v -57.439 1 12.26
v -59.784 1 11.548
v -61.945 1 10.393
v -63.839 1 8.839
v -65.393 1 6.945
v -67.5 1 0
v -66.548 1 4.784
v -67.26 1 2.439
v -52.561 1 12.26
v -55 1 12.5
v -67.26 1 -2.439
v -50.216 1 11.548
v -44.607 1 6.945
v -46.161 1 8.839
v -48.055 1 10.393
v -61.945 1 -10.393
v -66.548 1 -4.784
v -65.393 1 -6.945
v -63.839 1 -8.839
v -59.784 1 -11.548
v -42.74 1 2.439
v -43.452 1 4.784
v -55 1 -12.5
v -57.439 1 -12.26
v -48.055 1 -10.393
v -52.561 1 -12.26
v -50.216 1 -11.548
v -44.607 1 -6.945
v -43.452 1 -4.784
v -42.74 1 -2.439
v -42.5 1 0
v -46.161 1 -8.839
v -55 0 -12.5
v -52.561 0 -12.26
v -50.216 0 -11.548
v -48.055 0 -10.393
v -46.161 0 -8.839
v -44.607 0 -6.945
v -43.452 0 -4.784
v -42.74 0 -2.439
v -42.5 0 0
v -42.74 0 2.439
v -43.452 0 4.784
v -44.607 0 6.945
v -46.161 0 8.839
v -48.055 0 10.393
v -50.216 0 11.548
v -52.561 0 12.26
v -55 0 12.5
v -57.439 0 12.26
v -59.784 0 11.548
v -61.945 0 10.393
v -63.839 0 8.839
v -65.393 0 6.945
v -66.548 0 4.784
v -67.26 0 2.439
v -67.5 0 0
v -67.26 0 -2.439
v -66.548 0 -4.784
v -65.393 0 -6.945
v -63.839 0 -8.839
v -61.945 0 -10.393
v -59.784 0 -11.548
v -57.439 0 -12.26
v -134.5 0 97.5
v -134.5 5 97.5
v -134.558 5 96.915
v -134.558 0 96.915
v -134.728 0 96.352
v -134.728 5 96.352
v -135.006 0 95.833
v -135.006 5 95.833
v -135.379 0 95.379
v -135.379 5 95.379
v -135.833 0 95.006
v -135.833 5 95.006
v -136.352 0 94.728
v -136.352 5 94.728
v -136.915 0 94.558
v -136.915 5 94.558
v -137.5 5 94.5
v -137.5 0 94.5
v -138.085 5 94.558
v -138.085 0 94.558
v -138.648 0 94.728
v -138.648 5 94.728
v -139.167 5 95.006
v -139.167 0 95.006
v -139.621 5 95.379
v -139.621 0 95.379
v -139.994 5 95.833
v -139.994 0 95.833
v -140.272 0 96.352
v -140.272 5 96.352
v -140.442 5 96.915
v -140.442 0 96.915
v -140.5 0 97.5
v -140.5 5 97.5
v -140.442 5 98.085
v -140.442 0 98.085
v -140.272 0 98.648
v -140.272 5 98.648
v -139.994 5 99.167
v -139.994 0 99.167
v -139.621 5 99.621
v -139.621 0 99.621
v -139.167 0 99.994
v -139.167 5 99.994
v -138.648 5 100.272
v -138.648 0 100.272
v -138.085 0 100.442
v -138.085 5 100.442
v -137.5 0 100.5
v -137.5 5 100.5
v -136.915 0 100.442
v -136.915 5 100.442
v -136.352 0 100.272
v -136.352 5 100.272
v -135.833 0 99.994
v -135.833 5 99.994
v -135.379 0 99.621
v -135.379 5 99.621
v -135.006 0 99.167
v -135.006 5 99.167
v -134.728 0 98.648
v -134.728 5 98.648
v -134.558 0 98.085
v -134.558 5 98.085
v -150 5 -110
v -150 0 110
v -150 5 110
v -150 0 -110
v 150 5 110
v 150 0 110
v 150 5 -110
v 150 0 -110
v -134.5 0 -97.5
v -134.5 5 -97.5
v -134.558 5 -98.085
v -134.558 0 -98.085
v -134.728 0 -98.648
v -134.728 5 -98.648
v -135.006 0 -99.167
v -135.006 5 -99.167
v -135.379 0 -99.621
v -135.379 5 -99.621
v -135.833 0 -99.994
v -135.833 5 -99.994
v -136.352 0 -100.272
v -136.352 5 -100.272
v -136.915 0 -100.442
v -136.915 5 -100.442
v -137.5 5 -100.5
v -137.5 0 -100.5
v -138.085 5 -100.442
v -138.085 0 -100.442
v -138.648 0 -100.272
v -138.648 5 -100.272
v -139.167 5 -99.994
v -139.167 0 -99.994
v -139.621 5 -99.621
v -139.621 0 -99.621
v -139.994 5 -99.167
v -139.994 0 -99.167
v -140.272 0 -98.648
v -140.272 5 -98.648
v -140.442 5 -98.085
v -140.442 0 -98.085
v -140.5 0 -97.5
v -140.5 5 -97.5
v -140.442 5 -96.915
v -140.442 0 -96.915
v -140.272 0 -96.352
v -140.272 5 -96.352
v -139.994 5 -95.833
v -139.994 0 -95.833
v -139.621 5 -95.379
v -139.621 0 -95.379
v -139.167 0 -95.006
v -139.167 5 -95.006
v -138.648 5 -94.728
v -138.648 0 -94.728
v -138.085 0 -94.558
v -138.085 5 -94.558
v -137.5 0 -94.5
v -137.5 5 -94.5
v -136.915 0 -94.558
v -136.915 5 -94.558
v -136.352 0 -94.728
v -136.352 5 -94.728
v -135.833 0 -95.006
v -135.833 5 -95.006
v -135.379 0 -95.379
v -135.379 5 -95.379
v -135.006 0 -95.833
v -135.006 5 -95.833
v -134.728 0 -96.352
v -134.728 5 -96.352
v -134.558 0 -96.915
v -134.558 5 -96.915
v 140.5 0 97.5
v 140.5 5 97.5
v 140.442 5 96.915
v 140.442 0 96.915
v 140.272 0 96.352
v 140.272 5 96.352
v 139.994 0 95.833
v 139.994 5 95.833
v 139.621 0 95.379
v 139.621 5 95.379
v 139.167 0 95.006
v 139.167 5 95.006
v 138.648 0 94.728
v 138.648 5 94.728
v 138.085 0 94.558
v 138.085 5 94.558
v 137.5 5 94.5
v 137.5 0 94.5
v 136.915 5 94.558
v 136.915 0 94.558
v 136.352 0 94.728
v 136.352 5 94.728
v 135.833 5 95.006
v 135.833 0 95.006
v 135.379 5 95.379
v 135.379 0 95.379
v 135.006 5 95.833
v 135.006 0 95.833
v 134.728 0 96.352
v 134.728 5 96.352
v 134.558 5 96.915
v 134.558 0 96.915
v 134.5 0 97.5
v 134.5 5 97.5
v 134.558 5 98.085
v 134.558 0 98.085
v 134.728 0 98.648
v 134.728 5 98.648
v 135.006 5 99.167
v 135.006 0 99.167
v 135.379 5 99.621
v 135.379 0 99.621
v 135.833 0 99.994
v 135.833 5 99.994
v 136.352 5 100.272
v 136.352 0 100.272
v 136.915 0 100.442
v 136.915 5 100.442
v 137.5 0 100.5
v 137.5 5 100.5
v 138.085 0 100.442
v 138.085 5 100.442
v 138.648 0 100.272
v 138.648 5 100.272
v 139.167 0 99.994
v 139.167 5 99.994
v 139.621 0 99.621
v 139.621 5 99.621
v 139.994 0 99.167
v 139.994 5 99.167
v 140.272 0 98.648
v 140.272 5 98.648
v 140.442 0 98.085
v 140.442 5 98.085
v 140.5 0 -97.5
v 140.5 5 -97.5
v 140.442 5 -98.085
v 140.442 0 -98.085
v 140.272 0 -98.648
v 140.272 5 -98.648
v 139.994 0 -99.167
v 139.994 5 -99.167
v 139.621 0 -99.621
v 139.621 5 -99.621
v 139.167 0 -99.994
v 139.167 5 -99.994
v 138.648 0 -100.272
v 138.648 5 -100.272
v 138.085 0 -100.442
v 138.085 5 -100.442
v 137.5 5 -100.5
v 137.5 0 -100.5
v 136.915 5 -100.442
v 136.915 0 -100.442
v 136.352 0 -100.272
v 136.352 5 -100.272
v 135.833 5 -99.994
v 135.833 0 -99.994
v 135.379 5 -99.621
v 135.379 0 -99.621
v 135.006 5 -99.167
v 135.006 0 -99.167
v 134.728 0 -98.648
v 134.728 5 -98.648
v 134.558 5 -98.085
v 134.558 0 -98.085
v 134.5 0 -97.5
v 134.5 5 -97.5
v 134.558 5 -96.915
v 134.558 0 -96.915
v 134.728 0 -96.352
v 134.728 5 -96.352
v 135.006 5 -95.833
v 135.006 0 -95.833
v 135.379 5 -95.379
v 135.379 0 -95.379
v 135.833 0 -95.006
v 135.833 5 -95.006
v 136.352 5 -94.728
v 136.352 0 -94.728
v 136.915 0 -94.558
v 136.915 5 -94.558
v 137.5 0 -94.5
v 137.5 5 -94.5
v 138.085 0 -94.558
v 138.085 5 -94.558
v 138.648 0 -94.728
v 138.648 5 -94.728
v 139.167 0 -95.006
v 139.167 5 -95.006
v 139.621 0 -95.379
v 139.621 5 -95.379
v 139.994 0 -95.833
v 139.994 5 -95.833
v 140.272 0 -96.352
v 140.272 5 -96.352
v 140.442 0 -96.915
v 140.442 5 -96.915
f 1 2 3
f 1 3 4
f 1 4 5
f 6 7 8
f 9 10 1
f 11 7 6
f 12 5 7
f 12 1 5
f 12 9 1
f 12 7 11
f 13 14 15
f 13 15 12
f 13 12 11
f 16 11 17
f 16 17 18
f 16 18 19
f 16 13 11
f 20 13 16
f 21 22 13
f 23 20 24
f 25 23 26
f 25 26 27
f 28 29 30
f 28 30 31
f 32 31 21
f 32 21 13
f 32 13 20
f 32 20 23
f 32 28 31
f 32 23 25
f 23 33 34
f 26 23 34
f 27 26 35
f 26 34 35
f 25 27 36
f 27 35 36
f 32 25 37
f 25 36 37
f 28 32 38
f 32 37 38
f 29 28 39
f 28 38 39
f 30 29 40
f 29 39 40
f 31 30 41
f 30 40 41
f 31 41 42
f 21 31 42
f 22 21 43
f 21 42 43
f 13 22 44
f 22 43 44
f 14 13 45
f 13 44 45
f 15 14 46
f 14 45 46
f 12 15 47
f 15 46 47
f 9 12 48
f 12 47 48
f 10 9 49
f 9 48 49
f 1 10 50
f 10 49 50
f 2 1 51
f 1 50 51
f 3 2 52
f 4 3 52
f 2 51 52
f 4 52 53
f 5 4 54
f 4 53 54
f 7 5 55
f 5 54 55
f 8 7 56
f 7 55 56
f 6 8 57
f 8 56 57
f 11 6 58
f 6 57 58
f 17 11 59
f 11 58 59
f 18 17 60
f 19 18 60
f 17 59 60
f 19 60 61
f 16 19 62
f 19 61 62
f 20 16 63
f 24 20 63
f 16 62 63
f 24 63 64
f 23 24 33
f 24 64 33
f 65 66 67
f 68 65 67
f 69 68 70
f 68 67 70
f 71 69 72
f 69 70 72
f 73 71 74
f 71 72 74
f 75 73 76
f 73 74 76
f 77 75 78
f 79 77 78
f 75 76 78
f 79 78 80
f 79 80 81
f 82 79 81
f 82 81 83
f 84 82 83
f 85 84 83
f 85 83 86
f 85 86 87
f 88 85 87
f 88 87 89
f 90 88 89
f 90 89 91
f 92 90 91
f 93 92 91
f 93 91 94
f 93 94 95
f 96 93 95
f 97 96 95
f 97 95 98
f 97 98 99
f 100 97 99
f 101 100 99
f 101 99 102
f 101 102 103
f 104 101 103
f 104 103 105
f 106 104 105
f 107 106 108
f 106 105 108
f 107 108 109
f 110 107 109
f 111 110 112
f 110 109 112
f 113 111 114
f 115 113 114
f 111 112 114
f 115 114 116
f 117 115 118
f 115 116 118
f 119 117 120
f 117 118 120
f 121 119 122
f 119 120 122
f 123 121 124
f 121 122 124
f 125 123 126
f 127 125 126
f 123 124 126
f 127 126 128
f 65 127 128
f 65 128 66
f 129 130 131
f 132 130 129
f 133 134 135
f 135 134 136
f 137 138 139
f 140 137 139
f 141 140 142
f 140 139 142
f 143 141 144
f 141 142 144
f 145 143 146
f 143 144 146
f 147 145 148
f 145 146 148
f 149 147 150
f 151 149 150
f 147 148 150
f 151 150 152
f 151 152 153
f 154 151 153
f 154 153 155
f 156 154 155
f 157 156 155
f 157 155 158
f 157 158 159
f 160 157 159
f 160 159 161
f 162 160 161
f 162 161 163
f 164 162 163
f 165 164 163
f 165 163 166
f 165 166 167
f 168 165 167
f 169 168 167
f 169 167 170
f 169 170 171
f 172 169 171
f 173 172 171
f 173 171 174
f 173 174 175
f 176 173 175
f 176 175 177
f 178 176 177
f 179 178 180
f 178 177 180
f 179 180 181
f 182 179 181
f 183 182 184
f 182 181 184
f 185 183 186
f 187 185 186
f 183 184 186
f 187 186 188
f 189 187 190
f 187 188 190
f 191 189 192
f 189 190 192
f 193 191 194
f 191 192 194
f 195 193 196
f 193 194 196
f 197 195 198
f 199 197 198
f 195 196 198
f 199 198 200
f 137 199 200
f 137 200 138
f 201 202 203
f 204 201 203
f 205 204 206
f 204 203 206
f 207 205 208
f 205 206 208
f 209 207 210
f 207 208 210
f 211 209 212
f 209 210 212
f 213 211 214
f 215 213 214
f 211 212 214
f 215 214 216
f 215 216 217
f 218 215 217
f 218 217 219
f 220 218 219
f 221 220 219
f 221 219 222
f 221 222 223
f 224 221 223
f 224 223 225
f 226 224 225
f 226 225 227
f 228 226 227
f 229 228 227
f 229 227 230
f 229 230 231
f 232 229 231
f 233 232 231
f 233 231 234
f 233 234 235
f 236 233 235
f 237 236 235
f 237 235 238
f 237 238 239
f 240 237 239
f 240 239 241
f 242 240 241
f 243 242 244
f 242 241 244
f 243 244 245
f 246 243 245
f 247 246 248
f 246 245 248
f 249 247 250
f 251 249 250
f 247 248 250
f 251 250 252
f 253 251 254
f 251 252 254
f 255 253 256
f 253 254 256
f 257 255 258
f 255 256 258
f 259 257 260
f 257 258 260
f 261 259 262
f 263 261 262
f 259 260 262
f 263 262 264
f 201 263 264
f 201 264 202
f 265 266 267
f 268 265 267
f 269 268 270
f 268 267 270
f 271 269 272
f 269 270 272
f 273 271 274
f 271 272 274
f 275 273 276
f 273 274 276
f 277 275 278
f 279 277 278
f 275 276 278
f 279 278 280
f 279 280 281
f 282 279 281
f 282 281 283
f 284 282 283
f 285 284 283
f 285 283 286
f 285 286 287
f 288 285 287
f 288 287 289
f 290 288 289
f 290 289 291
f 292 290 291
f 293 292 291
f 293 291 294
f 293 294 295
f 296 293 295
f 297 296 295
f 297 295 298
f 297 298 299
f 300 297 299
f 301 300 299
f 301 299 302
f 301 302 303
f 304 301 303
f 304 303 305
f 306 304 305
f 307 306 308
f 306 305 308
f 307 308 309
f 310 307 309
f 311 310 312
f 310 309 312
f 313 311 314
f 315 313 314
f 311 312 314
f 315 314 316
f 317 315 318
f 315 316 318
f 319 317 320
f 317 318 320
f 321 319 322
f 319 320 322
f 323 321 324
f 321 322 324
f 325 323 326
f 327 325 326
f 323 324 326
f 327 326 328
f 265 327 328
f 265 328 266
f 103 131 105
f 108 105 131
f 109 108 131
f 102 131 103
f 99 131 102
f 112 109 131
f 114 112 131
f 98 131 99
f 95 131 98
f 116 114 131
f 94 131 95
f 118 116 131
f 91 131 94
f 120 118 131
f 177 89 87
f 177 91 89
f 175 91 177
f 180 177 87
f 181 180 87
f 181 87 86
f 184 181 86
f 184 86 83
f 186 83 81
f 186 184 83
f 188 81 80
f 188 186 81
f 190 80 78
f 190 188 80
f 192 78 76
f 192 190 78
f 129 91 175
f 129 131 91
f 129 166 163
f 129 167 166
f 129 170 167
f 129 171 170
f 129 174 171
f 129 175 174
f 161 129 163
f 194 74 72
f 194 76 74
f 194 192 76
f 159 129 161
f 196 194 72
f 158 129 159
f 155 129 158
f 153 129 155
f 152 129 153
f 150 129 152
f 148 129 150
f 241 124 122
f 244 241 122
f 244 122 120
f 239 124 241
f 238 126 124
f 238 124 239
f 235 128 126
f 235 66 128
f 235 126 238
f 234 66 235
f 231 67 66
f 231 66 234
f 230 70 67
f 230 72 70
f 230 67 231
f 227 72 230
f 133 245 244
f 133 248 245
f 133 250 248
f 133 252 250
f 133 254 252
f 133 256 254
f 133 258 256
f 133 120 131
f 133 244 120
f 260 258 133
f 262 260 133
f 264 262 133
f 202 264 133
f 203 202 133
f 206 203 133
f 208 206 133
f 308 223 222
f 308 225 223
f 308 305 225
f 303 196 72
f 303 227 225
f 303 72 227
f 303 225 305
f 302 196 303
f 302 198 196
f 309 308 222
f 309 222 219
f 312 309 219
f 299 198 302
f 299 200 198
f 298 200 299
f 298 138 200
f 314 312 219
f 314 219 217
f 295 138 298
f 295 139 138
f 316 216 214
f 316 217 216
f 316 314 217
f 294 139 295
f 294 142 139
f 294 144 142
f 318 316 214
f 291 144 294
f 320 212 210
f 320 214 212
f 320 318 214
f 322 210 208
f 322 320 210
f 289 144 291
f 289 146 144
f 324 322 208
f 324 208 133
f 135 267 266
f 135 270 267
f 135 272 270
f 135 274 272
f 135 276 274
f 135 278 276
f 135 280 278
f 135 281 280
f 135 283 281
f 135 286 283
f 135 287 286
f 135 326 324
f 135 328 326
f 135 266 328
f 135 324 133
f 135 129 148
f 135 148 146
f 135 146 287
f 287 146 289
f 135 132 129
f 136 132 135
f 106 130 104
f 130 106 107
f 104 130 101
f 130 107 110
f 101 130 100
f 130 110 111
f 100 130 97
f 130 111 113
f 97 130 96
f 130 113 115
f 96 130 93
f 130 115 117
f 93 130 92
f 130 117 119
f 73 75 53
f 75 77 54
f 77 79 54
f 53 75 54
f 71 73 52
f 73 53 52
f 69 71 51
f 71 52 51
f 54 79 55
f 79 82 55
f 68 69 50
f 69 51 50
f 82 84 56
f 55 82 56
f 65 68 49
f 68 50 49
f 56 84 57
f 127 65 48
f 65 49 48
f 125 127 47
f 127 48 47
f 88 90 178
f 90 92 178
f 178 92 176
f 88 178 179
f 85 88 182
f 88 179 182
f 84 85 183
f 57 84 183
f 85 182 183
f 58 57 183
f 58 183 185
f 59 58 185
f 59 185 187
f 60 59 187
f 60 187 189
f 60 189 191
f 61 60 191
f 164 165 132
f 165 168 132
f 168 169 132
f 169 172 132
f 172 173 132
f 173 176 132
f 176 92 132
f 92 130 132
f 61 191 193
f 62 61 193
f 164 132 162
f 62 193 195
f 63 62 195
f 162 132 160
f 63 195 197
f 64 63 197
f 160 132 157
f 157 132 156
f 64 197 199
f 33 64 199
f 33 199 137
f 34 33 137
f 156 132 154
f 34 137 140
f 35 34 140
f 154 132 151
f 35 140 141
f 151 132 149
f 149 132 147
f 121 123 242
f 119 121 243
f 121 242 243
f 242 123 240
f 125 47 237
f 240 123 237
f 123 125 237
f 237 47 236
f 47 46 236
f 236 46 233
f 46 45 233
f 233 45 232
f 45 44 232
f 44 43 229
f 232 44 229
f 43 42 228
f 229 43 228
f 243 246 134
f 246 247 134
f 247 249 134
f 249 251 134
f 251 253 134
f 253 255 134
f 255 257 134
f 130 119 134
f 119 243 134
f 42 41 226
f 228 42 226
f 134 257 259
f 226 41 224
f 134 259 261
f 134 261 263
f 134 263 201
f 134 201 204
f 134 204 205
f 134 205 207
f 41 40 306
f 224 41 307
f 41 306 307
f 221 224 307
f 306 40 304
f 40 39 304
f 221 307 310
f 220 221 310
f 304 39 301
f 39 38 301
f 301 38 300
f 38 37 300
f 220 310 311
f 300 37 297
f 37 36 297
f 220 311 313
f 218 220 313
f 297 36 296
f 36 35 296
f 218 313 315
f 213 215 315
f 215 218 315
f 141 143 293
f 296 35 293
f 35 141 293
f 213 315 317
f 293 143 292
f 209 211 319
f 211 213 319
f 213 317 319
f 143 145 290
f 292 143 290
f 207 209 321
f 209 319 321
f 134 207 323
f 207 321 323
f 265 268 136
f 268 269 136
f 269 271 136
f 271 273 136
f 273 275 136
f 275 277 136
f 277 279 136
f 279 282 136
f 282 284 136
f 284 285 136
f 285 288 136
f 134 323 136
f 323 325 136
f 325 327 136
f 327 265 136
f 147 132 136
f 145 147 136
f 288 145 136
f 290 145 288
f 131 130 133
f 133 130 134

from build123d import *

# Parameters (mm, degrees)
SKETCH1_W                    = 300
SKETCH1_H                    = 220
BOSS_EXTRUDE1_DEPTH          = 5
SKETCH2_R                    = 12.5
CUT_EXTRUDE1_DEPTH           = 1
F_6_0_6_DIAMETER_HOLE1_D     = 6
F_6_0_6_DIAMETER_HOLE1_DEPTH = 10
F_6_0_6_DIAMETER_HOLE1_TIP   = 1.802581857


with BuildPart() as part:
    # Sketch1 → Boss-Extrude1 (new body)
    with BuildSketch(Plane(origin=(0, 0, 0), x_dir=(1, 0, 0), z_dir=(0, 1, 0))):
        Rectangle(SKETCH1_W, SKETCH1_H)
    extrude(amount=BOSS_EXTRUDE1_DEPTH)

    # Sketch2 → Cut-Extrude1 (cut)
    with BuildSketch(Plane.XZ):
        with Locations(Location((-55, 0, 0), (0, 0, 270))):
            Circle(SKETCH2_R)
    extrude(amount=-CUT_EXTRUDE1_DEPTH, mode=Mode.SUBTRACT)

    # Ø6.0 (6) Diameter Hole1
    with Locations(Plane(origin=(0, 0, 0), x_dir=(-1, 0, 0), z_dir=(0, -1, 0))):
        with Locations((137.5, -97.5), (137.5, 97.5), (-137.5, 97.5), (-137.5, -97.5)):
            Hole(F_6_0_6_DIAMETER_HOLE1_D / 2, depth=F_6_0_6_DIAMETER_HOLE1_DEPTH)
            with Locations((0, 0, -(F_6_0_6_DIAMETER_HOLE1_DEPTH + F_6_0_6_DIAMETER_HOLE1_TIP / 2))):  # 118° drill point
                Cone(0, F_6_0_6_DIAMETER_HOLE1_D / 2, F_6_0_6_DIAMETER_HOLE1_TIP, mode=Mode.SUBTRACT)


solid = part.part
